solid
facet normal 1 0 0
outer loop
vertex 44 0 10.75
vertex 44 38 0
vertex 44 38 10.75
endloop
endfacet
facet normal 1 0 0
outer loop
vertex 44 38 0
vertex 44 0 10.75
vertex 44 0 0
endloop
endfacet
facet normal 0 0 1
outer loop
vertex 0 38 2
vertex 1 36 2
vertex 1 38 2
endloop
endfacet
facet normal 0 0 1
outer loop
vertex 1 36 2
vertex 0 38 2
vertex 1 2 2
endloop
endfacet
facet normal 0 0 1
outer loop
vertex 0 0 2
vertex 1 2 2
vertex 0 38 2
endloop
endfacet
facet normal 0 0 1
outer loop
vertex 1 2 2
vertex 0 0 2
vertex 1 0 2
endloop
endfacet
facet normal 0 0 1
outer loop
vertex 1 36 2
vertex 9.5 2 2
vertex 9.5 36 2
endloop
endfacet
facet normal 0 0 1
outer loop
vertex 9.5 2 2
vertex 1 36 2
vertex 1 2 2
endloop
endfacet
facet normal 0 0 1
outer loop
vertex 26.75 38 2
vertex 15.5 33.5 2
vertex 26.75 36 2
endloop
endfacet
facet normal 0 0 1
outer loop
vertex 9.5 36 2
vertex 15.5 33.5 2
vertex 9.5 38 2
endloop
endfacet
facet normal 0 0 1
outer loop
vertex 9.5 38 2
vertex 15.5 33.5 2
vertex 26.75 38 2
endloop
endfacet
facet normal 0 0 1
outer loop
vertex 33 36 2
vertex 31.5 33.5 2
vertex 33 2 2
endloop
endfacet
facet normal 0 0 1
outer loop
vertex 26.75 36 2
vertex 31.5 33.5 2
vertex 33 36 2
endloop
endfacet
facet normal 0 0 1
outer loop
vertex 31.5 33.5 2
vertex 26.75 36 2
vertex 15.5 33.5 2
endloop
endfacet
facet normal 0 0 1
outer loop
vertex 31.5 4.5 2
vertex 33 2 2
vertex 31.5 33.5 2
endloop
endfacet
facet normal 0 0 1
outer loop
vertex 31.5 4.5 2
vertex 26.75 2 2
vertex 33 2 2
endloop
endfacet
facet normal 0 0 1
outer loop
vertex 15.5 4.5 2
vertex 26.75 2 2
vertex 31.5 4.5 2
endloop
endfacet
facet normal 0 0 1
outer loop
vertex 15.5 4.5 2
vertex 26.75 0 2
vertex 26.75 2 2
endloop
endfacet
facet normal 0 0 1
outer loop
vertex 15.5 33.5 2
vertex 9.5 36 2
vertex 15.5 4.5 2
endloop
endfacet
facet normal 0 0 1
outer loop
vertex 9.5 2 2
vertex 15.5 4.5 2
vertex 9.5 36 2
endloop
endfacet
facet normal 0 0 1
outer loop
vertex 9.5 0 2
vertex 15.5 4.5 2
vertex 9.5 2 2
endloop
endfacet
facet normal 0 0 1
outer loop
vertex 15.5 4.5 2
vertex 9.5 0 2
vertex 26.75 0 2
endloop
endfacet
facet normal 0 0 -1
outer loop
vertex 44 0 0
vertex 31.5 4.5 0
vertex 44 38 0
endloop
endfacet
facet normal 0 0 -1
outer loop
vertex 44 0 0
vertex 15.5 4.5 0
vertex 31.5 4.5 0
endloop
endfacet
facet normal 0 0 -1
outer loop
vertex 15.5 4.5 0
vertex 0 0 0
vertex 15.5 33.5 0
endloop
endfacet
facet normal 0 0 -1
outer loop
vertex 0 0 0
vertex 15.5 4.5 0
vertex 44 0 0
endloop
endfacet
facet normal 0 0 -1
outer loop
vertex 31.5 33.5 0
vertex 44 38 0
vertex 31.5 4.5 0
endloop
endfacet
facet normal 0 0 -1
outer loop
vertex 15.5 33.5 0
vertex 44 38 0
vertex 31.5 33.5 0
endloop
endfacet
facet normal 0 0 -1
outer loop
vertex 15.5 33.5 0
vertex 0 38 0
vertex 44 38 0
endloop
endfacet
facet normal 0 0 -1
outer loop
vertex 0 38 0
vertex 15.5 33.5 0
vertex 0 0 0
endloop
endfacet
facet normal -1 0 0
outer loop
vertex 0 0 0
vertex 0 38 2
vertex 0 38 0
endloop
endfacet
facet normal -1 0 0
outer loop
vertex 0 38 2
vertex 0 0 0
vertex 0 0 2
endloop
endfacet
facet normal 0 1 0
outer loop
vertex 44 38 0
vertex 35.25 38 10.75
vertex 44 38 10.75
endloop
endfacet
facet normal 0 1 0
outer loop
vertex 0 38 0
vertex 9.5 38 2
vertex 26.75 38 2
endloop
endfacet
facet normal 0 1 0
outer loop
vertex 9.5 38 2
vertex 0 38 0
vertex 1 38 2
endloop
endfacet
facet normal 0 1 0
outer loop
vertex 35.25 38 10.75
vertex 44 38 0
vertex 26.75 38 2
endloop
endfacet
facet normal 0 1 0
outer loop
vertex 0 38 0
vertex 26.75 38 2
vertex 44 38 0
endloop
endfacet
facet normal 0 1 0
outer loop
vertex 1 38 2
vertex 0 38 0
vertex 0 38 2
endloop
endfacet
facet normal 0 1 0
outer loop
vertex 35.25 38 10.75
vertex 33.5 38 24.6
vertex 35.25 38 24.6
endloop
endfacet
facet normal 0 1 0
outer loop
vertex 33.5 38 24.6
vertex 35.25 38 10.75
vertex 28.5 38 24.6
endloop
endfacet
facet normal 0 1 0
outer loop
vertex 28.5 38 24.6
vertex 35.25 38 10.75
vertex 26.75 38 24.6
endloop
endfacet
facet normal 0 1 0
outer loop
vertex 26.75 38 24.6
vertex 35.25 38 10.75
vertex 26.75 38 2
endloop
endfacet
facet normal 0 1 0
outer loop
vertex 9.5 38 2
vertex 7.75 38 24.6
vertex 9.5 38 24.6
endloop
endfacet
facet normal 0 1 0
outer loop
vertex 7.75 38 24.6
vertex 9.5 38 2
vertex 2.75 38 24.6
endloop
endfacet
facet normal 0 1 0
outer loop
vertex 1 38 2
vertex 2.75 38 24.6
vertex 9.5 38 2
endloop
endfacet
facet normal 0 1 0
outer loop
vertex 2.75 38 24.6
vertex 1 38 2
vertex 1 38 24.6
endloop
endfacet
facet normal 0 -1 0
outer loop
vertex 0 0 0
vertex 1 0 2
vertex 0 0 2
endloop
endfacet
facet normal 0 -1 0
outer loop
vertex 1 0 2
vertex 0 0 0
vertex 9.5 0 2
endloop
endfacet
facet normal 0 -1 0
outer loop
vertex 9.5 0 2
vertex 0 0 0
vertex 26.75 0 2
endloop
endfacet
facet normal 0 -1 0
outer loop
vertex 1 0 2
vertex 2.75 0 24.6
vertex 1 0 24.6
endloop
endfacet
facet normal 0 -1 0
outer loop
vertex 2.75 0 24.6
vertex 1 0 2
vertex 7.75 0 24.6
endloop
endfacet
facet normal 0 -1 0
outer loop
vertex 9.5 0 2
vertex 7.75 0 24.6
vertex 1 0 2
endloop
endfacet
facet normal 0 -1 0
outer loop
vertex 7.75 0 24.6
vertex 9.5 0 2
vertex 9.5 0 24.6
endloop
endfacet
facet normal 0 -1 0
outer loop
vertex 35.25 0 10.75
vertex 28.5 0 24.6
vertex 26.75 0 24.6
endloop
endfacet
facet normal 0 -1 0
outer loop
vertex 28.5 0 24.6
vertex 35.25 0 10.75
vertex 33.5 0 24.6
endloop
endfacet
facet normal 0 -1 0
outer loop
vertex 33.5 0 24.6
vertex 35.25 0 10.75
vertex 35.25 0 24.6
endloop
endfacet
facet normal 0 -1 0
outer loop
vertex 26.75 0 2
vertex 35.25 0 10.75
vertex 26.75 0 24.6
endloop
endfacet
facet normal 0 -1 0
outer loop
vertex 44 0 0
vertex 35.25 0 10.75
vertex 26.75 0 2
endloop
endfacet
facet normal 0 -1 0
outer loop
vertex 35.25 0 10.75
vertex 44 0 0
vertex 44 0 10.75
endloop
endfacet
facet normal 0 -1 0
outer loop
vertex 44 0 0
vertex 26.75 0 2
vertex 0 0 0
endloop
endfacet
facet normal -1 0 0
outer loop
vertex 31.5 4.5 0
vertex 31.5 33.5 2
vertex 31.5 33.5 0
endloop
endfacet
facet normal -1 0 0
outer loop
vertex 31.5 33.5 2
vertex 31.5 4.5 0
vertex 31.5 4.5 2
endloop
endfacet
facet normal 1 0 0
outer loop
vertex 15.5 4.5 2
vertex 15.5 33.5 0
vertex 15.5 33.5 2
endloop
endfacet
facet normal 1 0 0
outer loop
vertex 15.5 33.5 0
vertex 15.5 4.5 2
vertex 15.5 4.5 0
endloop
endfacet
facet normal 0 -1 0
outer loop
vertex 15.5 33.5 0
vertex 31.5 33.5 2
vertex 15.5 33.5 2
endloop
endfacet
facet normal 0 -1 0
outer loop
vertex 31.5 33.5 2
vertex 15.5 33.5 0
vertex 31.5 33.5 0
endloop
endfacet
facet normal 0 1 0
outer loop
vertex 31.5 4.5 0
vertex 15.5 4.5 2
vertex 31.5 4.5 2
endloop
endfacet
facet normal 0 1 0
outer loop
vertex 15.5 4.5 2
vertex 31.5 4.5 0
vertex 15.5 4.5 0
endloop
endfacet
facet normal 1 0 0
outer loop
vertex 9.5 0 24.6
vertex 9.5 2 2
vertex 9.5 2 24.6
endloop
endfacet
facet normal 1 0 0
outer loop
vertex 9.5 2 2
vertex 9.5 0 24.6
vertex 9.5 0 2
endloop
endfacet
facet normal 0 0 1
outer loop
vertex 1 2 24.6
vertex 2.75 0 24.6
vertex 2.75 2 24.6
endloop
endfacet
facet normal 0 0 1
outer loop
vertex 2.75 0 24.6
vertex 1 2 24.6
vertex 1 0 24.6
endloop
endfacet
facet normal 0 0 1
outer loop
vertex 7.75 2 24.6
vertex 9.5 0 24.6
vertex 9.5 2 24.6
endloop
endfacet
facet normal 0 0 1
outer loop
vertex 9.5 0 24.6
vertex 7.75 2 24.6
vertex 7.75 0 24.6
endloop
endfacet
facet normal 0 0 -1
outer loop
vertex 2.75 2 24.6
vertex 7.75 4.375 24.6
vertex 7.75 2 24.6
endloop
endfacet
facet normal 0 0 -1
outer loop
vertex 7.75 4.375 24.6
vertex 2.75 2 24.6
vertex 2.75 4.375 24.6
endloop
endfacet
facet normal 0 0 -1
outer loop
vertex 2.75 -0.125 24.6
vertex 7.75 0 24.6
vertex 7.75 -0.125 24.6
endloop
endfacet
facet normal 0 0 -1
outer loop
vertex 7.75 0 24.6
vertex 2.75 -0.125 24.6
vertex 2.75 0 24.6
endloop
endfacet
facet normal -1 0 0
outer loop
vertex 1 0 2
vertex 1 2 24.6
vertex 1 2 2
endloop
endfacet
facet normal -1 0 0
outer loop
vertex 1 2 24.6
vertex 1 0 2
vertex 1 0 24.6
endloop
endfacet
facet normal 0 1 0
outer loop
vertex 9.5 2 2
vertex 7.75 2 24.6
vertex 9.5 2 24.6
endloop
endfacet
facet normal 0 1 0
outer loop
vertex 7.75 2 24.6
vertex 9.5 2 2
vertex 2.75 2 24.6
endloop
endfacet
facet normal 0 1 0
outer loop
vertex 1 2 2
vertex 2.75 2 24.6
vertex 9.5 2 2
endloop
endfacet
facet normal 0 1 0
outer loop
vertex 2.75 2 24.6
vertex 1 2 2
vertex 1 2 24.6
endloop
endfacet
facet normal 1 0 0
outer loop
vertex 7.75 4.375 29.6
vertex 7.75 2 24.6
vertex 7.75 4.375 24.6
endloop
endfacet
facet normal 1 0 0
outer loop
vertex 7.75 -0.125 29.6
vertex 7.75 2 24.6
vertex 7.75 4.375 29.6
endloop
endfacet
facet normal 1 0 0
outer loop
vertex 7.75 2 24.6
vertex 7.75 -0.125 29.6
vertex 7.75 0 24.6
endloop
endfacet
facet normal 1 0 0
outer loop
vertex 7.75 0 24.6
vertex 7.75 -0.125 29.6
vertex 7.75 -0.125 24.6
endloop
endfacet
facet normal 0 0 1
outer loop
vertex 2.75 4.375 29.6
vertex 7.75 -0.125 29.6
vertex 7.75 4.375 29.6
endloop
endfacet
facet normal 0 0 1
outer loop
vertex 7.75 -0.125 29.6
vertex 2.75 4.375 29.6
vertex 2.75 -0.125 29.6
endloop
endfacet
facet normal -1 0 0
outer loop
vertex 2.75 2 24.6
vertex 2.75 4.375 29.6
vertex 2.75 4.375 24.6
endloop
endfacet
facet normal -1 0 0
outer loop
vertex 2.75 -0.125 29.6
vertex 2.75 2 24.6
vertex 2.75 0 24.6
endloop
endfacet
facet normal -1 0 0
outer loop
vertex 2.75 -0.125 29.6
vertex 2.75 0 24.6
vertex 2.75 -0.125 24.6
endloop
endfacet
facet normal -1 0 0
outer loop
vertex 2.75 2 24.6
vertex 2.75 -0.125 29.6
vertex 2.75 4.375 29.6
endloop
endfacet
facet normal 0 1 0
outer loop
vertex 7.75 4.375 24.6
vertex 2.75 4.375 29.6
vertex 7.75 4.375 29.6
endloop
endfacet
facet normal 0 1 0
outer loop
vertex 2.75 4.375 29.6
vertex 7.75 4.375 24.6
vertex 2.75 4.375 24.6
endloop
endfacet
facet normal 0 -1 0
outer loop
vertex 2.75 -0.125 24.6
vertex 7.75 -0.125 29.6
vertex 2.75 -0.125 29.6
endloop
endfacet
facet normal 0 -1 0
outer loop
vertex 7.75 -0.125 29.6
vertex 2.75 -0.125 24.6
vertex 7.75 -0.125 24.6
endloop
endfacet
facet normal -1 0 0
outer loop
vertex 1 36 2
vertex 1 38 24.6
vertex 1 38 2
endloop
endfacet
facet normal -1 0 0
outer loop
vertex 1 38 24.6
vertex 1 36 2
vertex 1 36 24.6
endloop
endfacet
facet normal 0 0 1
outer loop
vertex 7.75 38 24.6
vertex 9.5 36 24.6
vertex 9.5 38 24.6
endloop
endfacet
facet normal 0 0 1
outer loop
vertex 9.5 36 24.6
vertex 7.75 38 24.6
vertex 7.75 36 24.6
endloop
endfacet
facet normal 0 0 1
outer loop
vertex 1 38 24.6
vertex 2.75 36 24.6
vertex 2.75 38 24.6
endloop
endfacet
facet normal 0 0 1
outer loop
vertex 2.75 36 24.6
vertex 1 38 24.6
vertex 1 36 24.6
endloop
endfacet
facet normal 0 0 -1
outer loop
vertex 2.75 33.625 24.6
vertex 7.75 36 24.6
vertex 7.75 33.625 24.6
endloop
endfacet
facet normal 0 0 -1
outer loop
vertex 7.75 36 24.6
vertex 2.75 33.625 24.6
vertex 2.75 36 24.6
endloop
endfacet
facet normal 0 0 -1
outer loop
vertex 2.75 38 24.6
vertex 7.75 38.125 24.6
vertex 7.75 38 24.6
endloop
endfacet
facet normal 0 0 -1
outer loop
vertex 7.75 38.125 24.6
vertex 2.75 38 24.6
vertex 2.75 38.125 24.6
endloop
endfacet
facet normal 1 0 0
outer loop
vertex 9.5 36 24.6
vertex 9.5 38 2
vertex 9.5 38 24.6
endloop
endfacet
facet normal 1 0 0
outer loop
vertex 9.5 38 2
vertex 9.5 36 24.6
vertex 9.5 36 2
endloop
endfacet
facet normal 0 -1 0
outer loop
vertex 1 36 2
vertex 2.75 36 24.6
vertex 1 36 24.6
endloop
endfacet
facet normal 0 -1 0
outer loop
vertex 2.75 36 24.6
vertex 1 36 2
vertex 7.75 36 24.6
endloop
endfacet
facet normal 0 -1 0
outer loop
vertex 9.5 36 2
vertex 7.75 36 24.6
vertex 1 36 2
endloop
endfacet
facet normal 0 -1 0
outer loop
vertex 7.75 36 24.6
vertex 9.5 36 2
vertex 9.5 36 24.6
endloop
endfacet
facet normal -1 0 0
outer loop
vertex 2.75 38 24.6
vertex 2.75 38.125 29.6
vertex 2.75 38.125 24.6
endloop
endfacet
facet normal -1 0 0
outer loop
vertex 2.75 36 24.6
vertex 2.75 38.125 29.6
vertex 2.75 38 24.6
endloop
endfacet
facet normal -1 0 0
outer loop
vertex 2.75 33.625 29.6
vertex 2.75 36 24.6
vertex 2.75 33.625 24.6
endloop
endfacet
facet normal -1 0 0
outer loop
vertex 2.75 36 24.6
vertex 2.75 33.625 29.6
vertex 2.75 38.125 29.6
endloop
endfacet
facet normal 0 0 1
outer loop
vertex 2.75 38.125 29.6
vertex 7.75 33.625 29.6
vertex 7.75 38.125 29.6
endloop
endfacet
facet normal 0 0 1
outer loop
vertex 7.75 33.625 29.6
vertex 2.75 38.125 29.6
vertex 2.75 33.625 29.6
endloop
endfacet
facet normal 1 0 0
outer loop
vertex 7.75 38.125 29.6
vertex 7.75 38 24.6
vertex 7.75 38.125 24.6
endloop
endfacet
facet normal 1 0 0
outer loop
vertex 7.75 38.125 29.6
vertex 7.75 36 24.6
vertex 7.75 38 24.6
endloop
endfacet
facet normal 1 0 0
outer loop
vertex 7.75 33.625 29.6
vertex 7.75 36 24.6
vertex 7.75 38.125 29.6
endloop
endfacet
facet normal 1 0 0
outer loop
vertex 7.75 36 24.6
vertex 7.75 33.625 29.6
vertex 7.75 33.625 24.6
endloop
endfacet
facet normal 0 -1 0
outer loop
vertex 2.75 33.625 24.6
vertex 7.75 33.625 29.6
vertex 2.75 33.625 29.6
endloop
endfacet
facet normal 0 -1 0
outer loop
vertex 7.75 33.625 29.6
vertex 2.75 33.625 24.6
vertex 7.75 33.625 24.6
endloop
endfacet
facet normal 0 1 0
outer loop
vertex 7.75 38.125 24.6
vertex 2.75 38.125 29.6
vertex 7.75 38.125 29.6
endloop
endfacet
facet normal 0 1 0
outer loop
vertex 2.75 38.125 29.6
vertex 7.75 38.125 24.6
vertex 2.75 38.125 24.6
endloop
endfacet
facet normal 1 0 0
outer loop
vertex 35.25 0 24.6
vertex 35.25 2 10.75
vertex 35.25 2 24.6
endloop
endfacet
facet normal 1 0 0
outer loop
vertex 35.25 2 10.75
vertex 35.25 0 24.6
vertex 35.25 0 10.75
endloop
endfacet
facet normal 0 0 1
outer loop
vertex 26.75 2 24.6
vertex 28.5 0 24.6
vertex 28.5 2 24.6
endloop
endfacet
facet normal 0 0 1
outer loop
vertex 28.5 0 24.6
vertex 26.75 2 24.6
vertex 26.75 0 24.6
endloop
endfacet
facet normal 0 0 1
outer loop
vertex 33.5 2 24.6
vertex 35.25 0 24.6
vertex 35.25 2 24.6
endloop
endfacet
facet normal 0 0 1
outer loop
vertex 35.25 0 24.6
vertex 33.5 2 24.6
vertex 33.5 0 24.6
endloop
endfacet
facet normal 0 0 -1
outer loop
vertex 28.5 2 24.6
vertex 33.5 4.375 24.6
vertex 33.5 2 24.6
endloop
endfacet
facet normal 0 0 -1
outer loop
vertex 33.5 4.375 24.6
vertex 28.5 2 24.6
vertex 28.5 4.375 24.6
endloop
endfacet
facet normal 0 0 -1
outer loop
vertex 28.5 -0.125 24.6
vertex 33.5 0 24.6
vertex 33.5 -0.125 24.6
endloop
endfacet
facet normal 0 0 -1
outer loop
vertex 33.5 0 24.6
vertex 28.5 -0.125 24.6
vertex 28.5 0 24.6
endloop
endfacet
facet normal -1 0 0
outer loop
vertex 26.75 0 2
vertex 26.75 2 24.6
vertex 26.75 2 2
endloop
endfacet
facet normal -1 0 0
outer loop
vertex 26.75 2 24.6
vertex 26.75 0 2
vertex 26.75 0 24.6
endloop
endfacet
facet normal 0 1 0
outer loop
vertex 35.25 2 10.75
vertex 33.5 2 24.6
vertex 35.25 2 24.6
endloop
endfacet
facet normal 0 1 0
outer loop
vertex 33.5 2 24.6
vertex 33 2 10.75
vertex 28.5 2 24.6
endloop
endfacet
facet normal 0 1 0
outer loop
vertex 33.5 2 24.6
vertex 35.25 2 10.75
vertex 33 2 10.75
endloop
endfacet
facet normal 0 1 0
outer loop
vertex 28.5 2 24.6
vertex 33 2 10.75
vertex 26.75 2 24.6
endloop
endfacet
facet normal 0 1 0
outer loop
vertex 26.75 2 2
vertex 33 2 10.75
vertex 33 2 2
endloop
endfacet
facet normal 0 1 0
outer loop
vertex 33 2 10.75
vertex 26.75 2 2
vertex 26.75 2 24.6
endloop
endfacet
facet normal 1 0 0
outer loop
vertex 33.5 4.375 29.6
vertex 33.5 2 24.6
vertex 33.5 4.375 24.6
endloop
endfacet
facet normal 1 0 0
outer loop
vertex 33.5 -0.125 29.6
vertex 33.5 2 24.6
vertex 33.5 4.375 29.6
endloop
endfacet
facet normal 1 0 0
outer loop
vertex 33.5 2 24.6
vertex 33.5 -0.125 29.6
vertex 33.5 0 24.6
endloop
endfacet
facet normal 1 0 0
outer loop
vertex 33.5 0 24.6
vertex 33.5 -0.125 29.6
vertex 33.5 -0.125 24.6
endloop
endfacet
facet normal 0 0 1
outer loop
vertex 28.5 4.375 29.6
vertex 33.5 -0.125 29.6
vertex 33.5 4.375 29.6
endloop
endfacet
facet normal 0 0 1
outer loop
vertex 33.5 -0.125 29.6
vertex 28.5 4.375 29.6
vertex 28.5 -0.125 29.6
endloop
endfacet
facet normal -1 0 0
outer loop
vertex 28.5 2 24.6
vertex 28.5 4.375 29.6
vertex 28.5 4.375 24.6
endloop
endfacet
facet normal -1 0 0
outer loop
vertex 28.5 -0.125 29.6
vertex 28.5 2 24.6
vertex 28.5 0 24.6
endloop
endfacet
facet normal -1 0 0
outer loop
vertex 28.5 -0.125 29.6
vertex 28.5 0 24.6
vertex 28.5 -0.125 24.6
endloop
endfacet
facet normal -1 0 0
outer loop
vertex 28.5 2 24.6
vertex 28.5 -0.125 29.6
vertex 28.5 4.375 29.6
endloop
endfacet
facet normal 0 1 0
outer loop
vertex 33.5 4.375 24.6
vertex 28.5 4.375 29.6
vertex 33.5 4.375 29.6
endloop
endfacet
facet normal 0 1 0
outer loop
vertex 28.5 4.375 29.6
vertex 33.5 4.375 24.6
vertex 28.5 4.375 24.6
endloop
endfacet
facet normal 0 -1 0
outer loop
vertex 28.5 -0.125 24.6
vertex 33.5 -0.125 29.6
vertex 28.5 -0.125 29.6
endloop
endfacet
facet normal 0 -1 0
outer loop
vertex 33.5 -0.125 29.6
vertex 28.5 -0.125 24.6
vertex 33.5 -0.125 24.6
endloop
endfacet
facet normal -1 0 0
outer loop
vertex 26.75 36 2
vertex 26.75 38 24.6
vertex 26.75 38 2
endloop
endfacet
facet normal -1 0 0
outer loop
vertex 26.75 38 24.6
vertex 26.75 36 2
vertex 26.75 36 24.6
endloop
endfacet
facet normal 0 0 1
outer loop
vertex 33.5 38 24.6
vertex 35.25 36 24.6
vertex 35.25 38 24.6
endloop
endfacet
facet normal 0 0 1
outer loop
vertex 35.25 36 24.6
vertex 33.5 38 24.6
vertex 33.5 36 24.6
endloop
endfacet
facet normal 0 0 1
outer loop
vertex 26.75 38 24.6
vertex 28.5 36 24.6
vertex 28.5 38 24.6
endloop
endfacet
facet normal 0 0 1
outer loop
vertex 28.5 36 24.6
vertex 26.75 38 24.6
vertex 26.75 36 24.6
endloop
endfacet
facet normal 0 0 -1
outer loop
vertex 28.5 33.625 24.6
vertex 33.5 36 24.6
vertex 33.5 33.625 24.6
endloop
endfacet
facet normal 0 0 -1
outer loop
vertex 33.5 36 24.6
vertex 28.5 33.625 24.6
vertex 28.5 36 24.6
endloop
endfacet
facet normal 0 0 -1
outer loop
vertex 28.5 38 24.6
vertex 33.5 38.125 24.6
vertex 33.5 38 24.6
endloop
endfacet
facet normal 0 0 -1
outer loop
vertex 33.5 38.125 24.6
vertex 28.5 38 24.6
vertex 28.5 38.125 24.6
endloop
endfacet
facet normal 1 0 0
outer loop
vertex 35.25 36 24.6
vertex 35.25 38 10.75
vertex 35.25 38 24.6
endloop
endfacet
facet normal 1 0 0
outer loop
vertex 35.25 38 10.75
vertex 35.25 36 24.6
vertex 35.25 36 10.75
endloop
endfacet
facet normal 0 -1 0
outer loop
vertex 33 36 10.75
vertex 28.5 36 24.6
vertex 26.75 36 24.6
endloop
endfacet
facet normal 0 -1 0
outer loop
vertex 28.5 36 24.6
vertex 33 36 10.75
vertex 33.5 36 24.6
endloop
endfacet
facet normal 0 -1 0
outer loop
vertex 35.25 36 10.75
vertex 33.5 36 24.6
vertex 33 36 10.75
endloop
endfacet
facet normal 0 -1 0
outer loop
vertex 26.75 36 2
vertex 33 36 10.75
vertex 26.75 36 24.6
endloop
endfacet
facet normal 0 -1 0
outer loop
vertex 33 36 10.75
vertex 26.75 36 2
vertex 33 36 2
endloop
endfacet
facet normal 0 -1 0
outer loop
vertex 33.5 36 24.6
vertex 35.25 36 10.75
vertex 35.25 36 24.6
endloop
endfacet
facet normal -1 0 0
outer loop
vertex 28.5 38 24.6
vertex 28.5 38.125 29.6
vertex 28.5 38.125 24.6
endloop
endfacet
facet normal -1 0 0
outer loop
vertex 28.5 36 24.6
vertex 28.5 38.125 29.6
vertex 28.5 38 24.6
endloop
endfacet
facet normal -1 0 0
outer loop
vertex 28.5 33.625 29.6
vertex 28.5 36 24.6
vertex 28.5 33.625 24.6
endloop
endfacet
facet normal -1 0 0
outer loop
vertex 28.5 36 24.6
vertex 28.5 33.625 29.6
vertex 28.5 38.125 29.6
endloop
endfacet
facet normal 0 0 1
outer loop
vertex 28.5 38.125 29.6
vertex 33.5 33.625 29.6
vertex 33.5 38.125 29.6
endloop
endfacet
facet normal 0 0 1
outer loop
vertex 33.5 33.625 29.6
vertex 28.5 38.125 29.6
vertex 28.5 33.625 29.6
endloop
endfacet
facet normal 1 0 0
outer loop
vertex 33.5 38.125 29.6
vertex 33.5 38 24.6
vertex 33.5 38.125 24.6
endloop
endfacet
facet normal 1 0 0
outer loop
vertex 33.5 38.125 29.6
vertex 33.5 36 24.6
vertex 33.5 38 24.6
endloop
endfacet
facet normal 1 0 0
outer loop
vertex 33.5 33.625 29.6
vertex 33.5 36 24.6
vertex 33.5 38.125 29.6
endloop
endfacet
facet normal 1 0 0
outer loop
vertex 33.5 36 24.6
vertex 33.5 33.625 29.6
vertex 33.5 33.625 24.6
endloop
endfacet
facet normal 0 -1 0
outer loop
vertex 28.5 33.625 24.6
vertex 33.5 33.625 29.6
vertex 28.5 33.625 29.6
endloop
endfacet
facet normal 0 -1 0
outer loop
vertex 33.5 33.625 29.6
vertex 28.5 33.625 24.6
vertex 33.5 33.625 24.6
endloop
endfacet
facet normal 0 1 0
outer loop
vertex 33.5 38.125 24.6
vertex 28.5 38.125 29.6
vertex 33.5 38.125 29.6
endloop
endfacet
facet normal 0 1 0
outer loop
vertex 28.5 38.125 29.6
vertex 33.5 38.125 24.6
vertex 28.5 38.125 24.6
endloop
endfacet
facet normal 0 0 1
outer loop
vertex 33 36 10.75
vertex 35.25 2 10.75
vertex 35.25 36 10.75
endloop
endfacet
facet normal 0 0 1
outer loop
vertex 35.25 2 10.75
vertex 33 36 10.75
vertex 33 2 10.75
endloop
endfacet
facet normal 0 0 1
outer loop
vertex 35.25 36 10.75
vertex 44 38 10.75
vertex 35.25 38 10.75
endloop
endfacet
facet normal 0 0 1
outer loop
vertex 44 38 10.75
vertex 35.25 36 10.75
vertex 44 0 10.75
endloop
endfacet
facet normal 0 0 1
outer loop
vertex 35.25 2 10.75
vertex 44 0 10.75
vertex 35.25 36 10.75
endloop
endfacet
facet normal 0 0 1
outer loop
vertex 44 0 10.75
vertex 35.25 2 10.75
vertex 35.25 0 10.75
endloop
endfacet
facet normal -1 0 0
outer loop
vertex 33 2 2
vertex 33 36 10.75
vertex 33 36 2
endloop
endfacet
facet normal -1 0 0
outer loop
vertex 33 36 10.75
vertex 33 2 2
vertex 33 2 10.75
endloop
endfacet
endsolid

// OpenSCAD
partialPrint = false;
postWidth = 8.5;
postDepth = 2;
postHeight = 24.6;
nubWidth = 5;
nubDepth = 4.5;
nubHeight = 5;
difference()
{
    union()
    {
        difference()
        {
            cube(size=[44,38,2]);
            translate([15.5, (38-29)/2, 0])
            cube(size=[16,29,2]);
        }
        translate([44-11,0,0])
        cube(size=[11,38,10.75]);
        translate([1,0,0]) postPair();
        translate([26.75,0,0]) postPair();
    }
    if (partialPrint)
    {
        translate([36,0,0])
        cube([1000,1000,1000]);
        translate([0,5.5,0])
        cube([1000,1000,1000]);
    }
}

module post() 
{
    cube([postWidth,postDepth,postHeight], true);
    translate([0,nubDepth/4,postHeight/2 + nubHeight/2])
        cube([nubWidth,nubDepth,nubHeight], true);
}
module postPair()
{
translate([postWidth/2,postDepth/2,postHeight/2])
    post();
translate([postWidth/2,38 - postDepth + postDepth/2,postHeight/2])
    rotate([0,0,180])
    post();
}
